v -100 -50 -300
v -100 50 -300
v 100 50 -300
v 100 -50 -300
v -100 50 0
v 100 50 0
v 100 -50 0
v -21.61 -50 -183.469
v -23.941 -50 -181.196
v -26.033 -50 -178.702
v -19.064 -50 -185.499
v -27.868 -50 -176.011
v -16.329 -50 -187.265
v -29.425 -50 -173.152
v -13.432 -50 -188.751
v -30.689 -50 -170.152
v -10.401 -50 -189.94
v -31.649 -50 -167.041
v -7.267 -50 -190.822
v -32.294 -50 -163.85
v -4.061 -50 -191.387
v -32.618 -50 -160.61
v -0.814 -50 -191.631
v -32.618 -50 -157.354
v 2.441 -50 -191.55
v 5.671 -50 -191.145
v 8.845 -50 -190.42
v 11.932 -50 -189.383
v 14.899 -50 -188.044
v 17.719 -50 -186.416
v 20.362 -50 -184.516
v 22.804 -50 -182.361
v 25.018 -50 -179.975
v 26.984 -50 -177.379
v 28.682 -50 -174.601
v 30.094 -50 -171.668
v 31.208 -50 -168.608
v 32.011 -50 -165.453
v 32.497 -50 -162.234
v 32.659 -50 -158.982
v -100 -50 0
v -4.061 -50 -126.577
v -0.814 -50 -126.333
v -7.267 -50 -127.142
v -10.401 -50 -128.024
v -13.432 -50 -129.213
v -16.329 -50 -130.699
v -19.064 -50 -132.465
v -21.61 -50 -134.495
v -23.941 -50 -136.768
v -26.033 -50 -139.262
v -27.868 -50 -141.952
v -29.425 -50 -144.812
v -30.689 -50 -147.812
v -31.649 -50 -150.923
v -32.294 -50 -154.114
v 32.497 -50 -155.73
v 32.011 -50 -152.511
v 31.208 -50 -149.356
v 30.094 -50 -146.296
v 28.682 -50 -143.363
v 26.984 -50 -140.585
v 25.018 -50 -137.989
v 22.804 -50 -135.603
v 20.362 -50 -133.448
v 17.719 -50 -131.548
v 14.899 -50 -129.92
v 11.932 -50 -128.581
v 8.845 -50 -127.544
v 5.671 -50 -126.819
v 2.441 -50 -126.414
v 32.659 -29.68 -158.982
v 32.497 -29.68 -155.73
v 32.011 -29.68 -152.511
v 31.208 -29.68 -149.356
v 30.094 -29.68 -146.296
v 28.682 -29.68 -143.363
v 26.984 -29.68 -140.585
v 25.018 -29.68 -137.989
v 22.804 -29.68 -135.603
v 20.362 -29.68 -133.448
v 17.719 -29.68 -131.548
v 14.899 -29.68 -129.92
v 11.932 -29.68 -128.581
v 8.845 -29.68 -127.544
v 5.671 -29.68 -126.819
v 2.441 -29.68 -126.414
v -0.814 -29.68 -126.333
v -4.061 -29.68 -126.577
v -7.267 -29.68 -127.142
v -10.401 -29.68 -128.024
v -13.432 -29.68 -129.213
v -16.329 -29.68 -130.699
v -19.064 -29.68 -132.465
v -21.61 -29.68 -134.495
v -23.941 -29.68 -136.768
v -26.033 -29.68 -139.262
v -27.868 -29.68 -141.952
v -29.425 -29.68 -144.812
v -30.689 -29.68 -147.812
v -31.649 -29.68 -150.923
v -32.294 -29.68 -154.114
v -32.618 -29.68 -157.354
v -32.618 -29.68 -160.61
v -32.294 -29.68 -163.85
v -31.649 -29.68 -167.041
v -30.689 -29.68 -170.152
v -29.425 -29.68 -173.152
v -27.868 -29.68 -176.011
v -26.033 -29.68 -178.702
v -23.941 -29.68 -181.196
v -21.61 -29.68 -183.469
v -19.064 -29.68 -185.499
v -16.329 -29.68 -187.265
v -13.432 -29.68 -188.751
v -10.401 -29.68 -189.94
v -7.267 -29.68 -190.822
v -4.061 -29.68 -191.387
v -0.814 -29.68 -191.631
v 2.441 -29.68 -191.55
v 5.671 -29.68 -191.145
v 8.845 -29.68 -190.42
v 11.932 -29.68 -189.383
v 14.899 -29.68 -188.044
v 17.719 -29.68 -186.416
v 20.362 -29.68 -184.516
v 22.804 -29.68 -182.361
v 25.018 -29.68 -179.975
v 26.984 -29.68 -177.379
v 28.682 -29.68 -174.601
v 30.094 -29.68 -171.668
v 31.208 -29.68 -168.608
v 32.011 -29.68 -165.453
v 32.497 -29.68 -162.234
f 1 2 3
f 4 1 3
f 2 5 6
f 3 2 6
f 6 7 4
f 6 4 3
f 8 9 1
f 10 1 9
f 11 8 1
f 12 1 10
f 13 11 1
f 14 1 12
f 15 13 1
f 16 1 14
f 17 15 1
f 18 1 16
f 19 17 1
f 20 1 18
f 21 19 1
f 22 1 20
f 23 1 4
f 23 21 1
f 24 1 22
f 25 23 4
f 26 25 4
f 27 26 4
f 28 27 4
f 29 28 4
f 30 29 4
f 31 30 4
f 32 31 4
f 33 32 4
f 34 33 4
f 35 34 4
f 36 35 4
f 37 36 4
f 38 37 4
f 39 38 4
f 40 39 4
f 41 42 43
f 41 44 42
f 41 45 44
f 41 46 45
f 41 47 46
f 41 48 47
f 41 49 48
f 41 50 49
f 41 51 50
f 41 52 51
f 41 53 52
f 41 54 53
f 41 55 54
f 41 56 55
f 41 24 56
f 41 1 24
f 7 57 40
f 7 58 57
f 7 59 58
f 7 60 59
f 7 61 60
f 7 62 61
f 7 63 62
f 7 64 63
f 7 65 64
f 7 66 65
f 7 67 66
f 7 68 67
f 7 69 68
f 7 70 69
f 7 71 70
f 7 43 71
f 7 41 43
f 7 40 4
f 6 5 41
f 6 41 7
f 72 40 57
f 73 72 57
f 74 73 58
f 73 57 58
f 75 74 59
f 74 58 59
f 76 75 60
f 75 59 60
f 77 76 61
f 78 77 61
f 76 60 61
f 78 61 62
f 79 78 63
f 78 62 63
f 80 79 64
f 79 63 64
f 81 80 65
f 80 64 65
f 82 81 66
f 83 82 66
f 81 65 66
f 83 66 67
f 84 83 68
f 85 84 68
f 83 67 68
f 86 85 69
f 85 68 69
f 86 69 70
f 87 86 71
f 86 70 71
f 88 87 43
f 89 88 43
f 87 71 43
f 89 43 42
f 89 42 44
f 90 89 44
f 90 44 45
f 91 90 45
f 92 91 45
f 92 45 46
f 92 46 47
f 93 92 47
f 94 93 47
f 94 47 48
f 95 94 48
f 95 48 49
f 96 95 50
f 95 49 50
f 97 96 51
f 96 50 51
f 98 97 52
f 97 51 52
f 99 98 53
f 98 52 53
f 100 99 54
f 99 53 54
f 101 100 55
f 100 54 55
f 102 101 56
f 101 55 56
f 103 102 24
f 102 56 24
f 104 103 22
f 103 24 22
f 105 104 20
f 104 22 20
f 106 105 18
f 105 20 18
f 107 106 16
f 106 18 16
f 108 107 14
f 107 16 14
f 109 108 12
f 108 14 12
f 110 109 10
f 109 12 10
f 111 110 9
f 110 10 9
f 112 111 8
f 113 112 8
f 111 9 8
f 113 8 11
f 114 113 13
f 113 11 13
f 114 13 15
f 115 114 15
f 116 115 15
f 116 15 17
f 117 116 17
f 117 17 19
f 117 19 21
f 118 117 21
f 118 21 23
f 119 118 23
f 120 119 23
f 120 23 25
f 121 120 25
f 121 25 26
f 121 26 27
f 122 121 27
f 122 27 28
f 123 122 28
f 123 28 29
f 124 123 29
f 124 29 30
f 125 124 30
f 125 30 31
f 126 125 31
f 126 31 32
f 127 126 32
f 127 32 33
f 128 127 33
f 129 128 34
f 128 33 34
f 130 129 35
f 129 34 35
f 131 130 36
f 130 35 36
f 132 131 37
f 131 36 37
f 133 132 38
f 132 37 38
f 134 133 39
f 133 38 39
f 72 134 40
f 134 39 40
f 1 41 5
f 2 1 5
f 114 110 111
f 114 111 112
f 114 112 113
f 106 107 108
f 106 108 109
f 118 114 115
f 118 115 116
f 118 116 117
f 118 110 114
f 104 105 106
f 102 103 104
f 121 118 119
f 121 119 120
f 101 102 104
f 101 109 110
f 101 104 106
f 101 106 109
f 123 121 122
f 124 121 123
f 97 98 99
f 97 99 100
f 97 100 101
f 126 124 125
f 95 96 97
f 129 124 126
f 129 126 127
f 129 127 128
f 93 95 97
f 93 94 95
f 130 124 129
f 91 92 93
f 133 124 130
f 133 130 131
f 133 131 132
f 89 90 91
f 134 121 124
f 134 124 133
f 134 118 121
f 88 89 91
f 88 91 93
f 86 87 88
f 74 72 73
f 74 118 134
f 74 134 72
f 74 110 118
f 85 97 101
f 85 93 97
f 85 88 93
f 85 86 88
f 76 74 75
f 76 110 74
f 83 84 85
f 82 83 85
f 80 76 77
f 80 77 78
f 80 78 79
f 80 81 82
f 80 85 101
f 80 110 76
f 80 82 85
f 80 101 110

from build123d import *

# Parameters (mm, degrees)
F0_W     = 200
F0_H     = 100
F1_DEPTH = 300
F2_R     = 32.658895
F3_DEPTH = 20.32


with BuildPart() as f1:
    # F0 (on Top) → F1 (new body)
    with BuildSketch(Plane.XY):
        Rectangle(F0_W, F0_H)
    extrude(amount=-F1_DEPTH)

    # F2 (on face) → F3 (cut)
    with BuildSketch(Plane.XZ.offset(50)):
        with Locations((0, -158.981949)):
            Circle(F2_R)
    extrude(amount=-F3_DEPTH, mode=Mode.SUBTRACT)


solid = f1.part
